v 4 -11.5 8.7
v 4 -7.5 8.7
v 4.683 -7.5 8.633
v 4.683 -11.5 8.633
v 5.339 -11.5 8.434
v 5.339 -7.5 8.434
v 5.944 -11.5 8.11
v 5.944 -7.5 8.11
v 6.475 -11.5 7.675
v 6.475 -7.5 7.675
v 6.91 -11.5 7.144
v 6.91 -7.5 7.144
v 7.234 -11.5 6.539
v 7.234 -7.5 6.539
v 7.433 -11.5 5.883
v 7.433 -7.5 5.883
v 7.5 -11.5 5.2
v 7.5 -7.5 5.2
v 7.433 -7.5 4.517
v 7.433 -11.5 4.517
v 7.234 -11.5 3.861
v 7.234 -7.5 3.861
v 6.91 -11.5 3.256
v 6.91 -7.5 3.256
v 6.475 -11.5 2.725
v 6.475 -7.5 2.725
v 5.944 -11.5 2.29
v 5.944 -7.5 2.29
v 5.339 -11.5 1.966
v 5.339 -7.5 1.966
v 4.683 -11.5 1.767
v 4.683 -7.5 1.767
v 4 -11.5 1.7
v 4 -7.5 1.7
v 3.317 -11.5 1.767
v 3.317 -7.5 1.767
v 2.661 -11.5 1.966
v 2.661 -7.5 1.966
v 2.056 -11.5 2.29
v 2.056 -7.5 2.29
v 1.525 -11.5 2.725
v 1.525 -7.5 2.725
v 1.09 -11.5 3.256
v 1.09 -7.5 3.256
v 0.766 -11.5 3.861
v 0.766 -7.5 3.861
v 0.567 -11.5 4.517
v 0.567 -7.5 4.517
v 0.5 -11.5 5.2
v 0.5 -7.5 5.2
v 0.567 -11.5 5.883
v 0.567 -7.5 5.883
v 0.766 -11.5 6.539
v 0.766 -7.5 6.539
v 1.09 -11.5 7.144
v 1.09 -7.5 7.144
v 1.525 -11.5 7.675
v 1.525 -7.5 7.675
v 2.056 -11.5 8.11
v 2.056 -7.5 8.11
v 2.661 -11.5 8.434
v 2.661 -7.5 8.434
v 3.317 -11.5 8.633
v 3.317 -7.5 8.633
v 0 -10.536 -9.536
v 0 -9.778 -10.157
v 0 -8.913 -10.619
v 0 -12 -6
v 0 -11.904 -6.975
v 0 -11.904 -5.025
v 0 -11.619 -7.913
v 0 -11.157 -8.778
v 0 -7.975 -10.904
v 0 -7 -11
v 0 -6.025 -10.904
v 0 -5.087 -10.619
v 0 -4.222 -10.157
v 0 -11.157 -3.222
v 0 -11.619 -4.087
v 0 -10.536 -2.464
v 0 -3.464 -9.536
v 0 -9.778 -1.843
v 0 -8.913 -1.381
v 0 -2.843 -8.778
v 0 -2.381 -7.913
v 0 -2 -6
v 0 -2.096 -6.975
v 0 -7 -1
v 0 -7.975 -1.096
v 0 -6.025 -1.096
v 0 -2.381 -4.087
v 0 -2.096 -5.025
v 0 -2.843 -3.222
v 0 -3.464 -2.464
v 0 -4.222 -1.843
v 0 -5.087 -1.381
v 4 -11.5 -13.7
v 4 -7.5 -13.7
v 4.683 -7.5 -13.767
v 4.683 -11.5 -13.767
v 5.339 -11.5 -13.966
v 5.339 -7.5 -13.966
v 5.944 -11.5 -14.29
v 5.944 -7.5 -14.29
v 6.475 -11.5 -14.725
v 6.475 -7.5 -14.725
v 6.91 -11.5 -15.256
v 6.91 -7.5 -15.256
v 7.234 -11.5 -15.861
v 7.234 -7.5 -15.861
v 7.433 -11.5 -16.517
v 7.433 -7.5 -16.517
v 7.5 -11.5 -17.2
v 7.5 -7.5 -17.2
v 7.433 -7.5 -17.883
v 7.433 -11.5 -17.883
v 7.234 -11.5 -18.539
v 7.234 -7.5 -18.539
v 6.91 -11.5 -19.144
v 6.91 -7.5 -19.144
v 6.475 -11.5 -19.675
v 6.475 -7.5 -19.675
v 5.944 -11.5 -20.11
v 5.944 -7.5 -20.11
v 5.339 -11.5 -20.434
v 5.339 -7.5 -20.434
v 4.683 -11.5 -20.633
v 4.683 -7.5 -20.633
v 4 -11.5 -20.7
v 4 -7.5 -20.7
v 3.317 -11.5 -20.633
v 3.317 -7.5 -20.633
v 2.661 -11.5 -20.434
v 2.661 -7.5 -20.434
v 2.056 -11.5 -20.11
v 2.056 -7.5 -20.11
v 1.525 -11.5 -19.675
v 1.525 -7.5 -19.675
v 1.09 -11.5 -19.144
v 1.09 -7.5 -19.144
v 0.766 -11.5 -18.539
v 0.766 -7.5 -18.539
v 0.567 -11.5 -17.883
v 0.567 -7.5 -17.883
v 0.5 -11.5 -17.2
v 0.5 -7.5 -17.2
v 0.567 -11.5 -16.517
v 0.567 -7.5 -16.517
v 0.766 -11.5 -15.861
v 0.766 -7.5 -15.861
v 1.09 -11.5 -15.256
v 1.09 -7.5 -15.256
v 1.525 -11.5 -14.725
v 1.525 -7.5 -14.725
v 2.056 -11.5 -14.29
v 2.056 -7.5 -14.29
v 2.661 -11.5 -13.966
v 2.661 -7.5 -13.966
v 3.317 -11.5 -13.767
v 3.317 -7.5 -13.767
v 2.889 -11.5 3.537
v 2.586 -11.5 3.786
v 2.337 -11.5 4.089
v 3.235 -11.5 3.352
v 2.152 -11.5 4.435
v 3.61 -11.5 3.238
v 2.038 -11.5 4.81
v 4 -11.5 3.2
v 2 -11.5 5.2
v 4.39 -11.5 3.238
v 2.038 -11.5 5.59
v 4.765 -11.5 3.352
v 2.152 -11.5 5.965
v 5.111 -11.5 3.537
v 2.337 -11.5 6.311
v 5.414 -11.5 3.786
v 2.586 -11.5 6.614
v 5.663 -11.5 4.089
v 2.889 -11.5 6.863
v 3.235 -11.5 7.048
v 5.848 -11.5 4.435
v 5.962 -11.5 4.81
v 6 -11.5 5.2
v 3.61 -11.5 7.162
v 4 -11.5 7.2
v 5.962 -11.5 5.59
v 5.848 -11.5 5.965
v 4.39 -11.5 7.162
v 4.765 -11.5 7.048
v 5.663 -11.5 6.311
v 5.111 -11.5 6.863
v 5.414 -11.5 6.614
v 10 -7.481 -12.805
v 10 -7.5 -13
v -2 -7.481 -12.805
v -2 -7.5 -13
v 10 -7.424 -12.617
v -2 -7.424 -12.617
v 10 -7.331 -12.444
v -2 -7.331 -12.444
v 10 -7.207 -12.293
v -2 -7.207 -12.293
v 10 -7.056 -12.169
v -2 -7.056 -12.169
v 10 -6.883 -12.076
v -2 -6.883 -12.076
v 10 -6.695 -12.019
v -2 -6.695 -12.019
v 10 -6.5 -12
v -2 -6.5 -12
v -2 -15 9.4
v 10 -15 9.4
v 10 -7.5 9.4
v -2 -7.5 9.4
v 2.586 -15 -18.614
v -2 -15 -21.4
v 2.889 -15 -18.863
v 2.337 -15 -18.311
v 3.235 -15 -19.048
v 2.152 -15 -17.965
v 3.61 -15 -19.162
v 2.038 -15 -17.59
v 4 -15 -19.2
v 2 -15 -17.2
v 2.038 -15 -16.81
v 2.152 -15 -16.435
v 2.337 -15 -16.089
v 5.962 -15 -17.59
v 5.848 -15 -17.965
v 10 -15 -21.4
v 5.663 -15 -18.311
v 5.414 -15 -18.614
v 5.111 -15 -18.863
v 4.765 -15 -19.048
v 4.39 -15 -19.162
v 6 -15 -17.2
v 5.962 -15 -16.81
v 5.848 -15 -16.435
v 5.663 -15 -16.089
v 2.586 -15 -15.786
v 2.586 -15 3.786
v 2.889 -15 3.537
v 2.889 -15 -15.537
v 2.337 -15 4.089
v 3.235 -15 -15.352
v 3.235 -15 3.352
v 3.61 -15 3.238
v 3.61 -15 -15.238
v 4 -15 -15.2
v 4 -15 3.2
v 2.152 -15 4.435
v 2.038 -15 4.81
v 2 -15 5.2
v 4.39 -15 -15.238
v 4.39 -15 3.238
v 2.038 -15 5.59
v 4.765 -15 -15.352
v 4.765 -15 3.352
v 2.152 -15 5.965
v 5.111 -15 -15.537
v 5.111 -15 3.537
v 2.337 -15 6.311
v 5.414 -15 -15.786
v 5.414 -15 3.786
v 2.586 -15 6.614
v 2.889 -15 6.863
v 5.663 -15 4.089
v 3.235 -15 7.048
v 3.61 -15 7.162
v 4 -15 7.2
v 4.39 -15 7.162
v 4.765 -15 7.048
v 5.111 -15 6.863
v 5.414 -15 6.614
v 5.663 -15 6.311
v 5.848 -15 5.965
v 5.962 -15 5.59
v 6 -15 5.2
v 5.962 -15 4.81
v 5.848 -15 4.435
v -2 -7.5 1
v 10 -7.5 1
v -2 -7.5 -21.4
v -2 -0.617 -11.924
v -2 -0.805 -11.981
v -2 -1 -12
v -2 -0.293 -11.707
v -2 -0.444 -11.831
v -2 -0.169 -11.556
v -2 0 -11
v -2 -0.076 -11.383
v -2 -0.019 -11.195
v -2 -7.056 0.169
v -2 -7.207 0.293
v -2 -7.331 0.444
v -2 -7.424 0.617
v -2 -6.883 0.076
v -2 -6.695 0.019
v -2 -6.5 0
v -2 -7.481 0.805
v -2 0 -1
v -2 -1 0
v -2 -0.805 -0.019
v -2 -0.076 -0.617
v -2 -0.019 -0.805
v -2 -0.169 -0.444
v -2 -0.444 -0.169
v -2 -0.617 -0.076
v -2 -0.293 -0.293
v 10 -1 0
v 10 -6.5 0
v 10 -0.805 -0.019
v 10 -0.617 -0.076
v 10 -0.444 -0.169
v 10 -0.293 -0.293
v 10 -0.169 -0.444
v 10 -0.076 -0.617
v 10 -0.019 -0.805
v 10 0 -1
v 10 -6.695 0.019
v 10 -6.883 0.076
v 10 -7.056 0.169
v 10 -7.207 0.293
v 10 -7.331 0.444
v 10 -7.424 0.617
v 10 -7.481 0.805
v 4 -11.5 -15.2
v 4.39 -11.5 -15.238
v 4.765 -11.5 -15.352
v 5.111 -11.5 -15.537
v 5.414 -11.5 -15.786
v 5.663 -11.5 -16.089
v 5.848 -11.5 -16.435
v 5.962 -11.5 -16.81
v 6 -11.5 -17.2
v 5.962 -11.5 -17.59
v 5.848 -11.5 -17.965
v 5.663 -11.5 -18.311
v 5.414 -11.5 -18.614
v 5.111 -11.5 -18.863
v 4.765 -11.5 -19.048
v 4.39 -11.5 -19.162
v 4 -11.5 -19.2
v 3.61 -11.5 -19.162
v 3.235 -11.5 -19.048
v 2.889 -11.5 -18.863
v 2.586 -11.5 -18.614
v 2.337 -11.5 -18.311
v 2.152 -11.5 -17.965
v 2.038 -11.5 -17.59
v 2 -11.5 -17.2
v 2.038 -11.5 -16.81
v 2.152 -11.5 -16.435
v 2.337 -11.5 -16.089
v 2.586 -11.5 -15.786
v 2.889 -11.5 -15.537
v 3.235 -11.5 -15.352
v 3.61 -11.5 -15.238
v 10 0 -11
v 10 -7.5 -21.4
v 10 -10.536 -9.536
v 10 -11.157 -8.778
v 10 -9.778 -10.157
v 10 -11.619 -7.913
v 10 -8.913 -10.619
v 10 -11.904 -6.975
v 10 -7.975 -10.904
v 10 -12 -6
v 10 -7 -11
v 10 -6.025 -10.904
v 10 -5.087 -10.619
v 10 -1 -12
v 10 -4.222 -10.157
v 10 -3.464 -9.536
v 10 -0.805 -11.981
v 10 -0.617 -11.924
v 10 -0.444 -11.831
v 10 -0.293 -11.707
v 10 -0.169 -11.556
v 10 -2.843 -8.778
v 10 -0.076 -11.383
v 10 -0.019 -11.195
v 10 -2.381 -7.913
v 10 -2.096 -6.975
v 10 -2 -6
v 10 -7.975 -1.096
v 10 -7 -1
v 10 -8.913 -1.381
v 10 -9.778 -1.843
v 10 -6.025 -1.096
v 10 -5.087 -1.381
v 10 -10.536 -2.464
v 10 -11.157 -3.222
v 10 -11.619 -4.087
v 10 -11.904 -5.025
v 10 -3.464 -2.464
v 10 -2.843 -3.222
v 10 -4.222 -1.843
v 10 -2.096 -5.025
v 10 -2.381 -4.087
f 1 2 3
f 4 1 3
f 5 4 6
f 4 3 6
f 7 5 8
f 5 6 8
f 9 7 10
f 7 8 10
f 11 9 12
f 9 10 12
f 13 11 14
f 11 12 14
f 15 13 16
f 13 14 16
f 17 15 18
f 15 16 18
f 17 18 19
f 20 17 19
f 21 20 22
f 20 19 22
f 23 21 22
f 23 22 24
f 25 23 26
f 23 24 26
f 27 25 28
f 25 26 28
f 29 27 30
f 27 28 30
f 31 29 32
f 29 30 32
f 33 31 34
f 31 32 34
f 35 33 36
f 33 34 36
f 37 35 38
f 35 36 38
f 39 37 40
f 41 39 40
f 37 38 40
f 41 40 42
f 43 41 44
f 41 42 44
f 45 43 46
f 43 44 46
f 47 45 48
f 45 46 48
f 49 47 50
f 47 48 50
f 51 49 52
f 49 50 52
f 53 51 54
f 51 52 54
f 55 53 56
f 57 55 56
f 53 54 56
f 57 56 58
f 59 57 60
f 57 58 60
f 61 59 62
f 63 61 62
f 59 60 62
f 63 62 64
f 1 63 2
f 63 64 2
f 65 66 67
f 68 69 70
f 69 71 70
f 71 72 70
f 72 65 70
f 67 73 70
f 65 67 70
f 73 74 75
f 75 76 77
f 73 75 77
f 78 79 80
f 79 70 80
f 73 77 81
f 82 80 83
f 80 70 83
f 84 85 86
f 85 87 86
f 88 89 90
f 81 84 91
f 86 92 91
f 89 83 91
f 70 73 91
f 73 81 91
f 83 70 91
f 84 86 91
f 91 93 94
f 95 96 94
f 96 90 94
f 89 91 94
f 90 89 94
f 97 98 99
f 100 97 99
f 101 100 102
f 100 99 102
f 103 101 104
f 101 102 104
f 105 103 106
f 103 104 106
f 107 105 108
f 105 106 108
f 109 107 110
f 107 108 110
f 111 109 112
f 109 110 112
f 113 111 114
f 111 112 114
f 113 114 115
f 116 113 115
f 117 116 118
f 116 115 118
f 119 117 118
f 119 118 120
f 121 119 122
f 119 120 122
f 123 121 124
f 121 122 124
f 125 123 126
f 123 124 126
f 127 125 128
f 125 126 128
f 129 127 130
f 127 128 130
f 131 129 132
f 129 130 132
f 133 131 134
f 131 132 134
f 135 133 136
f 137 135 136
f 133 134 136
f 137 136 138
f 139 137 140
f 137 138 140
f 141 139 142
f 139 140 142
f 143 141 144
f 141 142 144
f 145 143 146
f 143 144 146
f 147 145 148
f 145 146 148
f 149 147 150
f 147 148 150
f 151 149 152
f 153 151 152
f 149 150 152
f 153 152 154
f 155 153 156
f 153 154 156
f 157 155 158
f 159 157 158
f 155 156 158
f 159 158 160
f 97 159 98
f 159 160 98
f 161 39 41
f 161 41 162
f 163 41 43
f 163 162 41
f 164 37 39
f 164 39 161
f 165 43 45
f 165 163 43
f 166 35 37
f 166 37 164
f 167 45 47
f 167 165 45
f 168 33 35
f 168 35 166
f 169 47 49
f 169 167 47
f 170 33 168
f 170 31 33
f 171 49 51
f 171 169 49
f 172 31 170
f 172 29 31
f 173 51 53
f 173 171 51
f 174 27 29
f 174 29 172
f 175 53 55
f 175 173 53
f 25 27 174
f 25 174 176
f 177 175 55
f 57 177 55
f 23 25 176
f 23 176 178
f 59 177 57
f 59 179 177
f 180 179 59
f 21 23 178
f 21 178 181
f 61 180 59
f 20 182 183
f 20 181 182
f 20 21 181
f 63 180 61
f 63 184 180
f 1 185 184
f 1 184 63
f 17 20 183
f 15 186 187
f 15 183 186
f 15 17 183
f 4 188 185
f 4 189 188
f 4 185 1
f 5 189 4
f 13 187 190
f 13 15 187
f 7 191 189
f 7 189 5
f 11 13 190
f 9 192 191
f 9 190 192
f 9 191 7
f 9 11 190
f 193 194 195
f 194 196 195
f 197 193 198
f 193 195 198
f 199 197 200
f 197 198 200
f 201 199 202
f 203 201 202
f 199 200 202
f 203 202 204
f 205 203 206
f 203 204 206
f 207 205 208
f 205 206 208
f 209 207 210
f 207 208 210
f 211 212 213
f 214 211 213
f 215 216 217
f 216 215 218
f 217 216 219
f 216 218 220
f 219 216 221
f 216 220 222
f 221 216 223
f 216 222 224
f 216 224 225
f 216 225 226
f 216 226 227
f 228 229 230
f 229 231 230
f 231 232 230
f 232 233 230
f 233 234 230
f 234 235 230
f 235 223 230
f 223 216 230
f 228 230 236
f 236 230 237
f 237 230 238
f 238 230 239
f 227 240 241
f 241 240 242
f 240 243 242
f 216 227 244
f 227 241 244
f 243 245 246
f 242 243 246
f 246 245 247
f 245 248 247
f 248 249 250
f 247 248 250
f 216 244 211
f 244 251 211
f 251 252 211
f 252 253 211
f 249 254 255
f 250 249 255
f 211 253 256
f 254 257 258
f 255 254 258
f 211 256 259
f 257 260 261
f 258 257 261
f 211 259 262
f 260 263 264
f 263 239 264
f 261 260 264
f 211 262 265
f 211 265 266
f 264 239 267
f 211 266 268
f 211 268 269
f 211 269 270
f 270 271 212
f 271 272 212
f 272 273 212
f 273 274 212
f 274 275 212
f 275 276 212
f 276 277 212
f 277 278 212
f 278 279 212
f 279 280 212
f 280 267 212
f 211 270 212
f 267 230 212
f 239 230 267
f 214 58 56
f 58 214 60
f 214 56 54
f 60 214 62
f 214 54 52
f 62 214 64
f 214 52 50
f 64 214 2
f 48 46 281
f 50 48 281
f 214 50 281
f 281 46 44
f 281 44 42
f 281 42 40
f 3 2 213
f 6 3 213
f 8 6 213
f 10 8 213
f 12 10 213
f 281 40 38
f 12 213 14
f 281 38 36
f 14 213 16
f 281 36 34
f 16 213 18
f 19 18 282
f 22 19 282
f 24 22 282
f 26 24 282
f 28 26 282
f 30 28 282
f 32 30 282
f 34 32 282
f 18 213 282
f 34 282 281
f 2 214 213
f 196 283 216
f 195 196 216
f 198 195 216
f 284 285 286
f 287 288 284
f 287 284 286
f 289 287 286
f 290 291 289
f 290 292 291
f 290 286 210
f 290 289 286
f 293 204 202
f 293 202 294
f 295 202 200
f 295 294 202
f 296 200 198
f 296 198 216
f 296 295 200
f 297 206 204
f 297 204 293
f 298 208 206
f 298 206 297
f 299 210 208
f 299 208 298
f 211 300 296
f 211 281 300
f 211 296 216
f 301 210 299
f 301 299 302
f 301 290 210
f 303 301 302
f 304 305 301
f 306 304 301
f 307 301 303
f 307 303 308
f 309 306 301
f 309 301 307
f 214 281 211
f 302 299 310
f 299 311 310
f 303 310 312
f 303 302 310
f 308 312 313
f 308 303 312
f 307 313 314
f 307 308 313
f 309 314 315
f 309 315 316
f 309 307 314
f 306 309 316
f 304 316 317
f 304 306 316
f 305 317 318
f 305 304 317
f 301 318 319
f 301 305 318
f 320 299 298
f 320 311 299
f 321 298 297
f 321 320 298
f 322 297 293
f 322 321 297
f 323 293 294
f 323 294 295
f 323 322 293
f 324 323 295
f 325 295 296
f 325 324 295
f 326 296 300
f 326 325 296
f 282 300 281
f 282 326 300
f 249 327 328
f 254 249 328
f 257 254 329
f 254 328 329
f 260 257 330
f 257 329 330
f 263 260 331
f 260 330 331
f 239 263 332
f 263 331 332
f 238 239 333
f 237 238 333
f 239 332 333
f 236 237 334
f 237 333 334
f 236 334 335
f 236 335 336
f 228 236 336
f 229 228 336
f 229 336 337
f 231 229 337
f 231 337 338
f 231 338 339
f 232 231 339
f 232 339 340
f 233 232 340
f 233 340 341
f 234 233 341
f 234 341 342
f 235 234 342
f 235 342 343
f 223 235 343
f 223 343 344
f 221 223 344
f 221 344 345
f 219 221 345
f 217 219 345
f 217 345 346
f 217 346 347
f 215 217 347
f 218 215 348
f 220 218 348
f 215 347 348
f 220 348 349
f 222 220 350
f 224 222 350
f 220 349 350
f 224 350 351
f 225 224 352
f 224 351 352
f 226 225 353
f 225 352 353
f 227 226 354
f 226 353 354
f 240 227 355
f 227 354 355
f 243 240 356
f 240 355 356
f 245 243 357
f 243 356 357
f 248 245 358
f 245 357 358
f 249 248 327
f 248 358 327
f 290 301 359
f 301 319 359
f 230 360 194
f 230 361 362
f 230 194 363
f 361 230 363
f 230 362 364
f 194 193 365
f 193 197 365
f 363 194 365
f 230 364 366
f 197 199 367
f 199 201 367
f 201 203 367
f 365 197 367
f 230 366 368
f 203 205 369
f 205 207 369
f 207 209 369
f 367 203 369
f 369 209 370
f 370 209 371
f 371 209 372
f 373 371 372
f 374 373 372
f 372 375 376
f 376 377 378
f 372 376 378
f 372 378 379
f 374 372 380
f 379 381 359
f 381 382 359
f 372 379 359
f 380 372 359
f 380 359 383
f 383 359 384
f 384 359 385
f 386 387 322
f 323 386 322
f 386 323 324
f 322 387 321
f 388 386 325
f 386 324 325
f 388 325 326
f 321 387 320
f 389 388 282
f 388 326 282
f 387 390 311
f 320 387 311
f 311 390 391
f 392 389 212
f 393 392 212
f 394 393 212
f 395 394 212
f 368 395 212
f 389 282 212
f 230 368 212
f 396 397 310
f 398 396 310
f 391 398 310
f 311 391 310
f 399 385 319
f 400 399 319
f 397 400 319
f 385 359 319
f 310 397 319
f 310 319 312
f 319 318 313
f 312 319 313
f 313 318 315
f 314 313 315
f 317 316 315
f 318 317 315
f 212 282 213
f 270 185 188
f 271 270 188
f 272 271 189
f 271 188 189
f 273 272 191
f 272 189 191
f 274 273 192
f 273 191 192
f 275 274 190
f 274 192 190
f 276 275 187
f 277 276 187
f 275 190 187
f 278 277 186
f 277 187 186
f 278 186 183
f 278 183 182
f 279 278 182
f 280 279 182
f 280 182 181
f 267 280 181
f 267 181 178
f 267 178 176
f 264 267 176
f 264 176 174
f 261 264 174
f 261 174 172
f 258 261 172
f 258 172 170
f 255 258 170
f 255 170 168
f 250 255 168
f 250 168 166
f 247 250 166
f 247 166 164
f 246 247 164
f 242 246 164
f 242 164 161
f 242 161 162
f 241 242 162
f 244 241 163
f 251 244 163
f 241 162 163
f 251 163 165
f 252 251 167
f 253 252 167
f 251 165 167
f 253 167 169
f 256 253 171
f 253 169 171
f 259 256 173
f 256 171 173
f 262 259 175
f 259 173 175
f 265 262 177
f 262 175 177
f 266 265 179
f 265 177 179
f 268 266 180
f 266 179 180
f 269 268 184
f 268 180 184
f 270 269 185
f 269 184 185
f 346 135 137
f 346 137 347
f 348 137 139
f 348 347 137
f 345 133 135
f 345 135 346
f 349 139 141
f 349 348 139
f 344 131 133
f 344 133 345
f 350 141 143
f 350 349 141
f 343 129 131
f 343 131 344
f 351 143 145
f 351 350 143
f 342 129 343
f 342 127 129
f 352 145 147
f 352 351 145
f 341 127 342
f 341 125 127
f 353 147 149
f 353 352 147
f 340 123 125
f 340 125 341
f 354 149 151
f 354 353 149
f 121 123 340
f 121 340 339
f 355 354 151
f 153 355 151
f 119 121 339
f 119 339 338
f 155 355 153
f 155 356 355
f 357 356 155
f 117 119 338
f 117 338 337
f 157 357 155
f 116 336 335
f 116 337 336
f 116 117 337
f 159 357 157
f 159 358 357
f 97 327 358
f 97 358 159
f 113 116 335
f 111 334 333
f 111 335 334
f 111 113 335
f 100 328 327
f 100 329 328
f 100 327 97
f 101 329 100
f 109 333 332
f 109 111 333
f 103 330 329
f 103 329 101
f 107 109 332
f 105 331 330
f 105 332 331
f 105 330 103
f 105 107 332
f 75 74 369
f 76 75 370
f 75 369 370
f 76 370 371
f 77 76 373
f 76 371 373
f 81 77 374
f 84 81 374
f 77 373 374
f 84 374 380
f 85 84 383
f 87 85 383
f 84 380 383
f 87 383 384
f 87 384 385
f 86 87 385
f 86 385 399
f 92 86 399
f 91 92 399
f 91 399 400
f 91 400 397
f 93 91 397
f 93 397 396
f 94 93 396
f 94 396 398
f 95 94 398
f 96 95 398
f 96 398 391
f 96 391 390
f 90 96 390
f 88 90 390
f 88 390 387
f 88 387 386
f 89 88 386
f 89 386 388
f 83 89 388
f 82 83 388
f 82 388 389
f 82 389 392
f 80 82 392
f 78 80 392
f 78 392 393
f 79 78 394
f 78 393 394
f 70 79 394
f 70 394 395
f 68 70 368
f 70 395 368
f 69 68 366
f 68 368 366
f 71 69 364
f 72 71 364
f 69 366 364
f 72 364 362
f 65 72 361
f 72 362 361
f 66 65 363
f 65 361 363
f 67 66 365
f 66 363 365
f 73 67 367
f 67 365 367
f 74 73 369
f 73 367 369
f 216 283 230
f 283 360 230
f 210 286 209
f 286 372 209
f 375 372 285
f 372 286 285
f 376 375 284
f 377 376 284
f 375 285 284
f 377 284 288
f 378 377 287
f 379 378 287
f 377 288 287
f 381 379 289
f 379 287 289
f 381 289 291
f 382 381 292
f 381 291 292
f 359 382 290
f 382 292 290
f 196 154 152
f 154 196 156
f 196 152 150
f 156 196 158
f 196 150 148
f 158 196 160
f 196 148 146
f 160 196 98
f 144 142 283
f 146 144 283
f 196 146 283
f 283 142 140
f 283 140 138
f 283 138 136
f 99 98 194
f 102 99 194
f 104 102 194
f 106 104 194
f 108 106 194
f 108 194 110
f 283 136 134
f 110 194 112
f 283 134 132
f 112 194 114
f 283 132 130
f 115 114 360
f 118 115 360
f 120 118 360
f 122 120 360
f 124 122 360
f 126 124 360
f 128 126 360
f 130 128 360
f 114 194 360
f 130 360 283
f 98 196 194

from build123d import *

# Parameters (mm, degrees)
BOSS_EXTRUDE1_DEPTH = 10
CUT_EXTRUDE1_REACH  = 29.981
SKETCH3_R           = 5
BOSS_EXTRUDE2_DEPTH = 2
FILLET1_R           = 1
CUT_EXTRUDE2_REACH  = 26.783
SKETCH5_R           = 2
SKETCH6_R           = 3.5
CUT_EXTRUDE3_DEPTH  = 4


with BuildPart() as part:
    # Sketch2 → Boss-Extrude1 (new body)
    with BuildSketch(Plane(origin=(0, 0, 0), x_dir=(0, 0, -1), z_dir=(1, 0, 0))):
        Polygon((0, 0), (12, 0), (12, -7.5), (21.4, -7.5), (21.4, -15), (-9.4, -15), (-9.4, -7.5), (0, -7.5), align=None)
    extrude(amount=BOSS_EXTRUDE1_DEPTH)

    # Sketch3 → Cut-Extrude1 (cut, up to next)
    with BuildSketch(Plane(origin=(10, 0, 0), x_dir=(0, 0, -1), z_dir=(1, 0, 0)), mode=Mode.PRIVATE) as cut_extrude1_sk1:
        with Locations((6, -7)):
            Circle(SKETCH3_R)
    cut_extrude1_tool1 = extrude(cut_extrude1_sk1.sketch, amount=-CUT_EXTRUDE1_REACH, mode=Mode.PRIVATE) & part.part
    add(cut_extrude1_tool1.solids().sort_by_distance((10, -7, -6))[0], mode=Mode.SUBTRACT)

    # Sketch4 → Boss-Extrude2 (add)
    with BuildSketch(Plane.ZY):
        Polygon((0, -7.5), (0, 0), (-12, 0), (-12, -7.5), (-21.4, -7.5), (-21.4, -15), (9.4, -15), (9.4, -7.5), align=None)
    extrude(amount=BOSS_EXTRUDE2_DEPTH)

    # Fillet1
    fillet1_edges = [part.edges().sort_by_distance(p)[0] for p in [
        (4, 0, 0),
        (4, 0, -12),
        (4, -7.5, -12),
        (4, -7.5, 0),
    ]]
    fillet(fillet1_edges, radius=FILLET1_R)

    # Sketch5 → Cut-Extrude2 (cut, up to next)
    with BuildSketch(Plane(origin=(0, -7.5, 0), x_dir=(1, 0, 0), z_dir=(0, 1, 0)), mode=Mode.PRIVATE) as cut_extrude2_sk1:
        with Locations(Location((4, 17.2, 0), (0, 0, 270))):
            Circle(SKETCH5_R)
    cut_extrude2_tool1 = extrude(cut_extrude2_sk1.sketch, amount=-CUT_EXTRUDE2_REACH, mode=Mode.PRIVATE) & part.part
    # Sketch5 → Cut-Extrude2 (cut, up to next)
    with BuildSketch(Plane(origin=(0, -7.5, 0), x_dir=(1, 0, 0), z_dir=(0, 1, 0)), mode=Mode.PRIVATE) as cut_extrude2_sk2:
        with Locations(Location((4, -5.2, 0), (0, 0, 270))):
            Circle(SKETCH5_R)
    cut_extrude2_tool2 = extrude(cut_extrude2_sk2.sketch, amount=-CUT_EXTRUDE2_REACH, mode=Mode.PRIVATE) & part.part
    add(cut_extrude2_tool1.solids().sort_by_distance((4, -7.5, -17.2))[0], mode=Mode.SUBTRACT)
    add(cut_extrude2_tool2.solids().sort_by_distance((4, -7.5, 5.2))[0], mode=Mode.SUBTRACT)

    # Sketch6 → Cut-Extrude3 (cut)
    with BuildSketch(Plane(origin=(0, -7.5, 0), x_dir=(1, 0, 0), z_dir=(0, 1, 0))):
        with Locations(Location((4, -5.2, 0), (0, 0, 270))):
            Circle(SKETCH6_R)
        with Locations(Location((4, 17.2, 0), (0, 0, 270))):
            Circle(SKETCH6_R)
    extrude(amount=-CUT_EXTRUDE3_DEPTH, mode=Mode.SUBTRACT)


solid = part.part
